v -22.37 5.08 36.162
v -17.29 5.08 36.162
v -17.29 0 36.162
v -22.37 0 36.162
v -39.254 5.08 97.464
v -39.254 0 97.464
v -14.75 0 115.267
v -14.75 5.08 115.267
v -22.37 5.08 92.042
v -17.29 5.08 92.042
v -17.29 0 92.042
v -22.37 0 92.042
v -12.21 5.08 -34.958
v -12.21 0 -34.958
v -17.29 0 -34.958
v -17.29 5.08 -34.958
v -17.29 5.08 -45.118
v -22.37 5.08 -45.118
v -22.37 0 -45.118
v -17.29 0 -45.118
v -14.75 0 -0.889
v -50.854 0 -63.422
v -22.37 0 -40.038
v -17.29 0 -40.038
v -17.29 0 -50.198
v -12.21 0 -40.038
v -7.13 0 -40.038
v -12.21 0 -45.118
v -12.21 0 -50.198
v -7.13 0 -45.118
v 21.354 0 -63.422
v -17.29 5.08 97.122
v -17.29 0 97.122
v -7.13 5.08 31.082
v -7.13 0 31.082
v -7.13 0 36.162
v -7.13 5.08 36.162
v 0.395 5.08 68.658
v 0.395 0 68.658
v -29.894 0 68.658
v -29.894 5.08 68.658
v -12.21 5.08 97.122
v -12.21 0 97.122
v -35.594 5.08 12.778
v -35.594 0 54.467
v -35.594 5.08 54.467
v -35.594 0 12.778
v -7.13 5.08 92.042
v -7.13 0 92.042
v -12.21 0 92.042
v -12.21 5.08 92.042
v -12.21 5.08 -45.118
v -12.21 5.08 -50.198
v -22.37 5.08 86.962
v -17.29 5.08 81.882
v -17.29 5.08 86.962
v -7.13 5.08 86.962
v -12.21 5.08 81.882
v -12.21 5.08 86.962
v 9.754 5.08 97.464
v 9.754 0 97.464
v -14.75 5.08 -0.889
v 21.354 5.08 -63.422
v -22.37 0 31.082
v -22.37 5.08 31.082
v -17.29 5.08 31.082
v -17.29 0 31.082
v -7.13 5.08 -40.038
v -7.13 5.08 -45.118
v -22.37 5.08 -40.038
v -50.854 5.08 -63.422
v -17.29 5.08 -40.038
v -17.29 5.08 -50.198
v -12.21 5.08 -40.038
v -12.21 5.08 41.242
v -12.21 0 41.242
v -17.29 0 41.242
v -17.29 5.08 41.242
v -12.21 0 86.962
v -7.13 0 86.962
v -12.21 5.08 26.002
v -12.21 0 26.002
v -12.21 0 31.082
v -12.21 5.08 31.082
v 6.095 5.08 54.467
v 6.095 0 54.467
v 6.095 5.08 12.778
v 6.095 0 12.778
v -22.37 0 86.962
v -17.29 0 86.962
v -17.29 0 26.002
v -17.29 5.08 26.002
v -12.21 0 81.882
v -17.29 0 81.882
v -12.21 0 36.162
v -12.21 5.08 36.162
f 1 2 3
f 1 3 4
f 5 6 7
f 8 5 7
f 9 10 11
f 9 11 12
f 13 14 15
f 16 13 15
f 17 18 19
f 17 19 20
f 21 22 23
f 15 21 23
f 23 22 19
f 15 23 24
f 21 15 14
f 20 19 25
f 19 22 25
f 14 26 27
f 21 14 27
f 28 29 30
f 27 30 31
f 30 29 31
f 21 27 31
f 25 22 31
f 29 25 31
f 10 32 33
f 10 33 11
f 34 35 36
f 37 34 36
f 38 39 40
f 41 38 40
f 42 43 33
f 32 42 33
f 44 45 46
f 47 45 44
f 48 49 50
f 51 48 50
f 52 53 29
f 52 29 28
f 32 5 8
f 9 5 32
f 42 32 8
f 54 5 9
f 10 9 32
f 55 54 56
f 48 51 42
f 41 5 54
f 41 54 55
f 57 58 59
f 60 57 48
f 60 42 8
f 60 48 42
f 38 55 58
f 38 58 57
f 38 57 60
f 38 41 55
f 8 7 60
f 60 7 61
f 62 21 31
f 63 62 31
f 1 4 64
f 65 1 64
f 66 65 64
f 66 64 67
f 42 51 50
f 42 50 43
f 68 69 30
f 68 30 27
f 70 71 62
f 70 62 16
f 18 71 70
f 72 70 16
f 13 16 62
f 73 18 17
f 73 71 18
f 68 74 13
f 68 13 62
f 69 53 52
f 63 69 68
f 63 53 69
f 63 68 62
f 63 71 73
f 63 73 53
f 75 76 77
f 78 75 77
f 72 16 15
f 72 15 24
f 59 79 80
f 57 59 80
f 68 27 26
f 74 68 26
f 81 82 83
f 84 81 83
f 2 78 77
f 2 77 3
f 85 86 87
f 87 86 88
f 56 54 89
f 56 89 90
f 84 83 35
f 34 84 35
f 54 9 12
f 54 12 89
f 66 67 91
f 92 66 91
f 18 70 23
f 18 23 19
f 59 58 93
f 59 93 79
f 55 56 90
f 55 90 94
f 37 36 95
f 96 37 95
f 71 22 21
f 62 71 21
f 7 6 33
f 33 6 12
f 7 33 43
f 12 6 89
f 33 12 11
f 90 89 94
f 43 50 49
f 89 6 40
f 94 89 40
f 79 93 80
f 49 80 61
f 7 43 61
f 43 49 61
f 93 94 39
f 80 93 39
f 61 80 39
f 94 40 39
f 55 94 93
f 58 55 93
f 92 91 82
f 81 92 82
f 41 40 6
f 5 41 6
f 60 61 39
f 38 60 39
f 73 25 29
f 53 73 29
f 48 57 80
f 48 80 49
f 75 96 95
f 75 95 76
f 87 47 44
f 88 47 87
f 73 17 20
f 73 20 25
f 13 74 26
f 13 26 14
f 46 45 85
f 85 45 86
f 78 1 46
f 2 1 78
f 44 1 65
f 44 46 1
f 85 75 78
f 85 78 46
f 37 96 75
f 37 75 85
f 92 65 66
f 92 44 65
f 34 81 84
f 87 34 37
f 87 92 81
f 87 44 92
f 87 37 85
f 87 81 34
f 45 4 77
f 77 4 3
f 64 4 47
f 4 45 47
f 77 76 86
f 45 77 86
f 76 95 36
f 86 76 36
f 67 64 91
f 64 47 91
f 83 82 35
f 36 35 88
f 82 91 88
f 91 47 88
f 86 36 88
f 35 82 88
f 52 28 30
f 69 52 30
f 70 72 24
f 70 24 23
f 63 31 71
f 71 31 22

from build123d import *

# Parameters (mm, degrees)
BOSS_EXTRUDE1_DEPTH   = 5.08
SKETCH3_W             = 41.68902
SKETCH3_H             = 41.68902
BOSS_EXTRUDE1_2_DEPTH = 5.08
BOSS_EXTRUDE1_3_DEPTH = 5.08


with BuildPart() as part:
    # Sketch3 → Boss-Extrude1 (new body)
    with BuildSketch(Plane(origin=(0, 0, 0), x_dir=(1, 0, 0), z_dir=(0, 1, 0))):
        Polygon((-14.749865829, 0.888926026), (21.35388455, 63.422456026), (-50.853616208, 63.422456026), align=None)
        Polygon((-14.749865829, 50.197946026), (-12.209865829, 50.197946026), (-12.209865829, 45.117946026), (-7.129865829, 45.117946026), (-7.129865829, 42.577946026), (-7.129865829, 40.037946026), (-12.209865829, 40.037946026), (-12.209865829, 34.957946026), (-14.749865829, 34.957946026), (-17.289865829, 34.957946026), (-17.289865829, 40.037946026), (-22.369865829, 40.037946026), (-22.369865829, 42.577946026), (-22.369865829, 45.117946026), (-17.289865829, 45.117946026), (-17.289865829, 50.197946026), align=None, mode=Mode.SUBTRACT)
    extrude(amount=BOSS_EXTRUDE1_DEPTH)


with BuildPart() as body_2:
    # Sketch3 → Boss-Extrude1 2 (new body)
    with BuildSketch(Plane(origin=(0, 0, 0), x_dir=(1, 0, 0), z_dir=(0, 1, 0))):
        with Locations((-14.749865829, -33.622053974)):
            Rectangle(SKETCH3_W, SKETCH3_H)
        Polygon((-7.129865829, -31.082053974), (-7.129865829, -33.622053974), (-7.129865829, -36.162053974), (-12.209865829, -36.162053974), (-12.209865829, -41.242053974), (-14.749865829, -41.242053974), (-17.289865829, -41.242053974), (-17.289865829, -36.162053974), (-22.369865829, -36.162053974), (-22.369865829, -33.622053974), (-22.369865829, -31.082053974), (-17.289865829, -31.082053974), (-17.289865829, -26.002053974), (-14.749865829, -26.002053974), (-12.209865829, -26.002053974), (-12.209865829, -31.082053974), align=None, mode=Mode.SUBTRACT)
    extrude(amount=BOSS_EXTRUDE1_2_DEPTH)


with BuildPart() as body_3:
    # Sketch3 → Boss-Extrude1 3 (new body)
    with BuildSketch(Plane(origin=(0, 0, 0), x_dir=(1, 0, 0), z_dir=(0, 1, 0))):
        Polygon((-14.749865829, -115.267285291), (9.754325309, -97.463948315), (0.394557161, -68.657543974), (-29.894288819, -68.657543974), (-39.254056968, -97.463948315), align=None)
        Polygon((-22.369865829, -92.042053974), (-22.369865829, -89.502053974), (-22.369865829, -86.962053974), (-17.289865829, -86.962053974), (-17.289865829, -81.882053974), (-14.749865829, -81.882053974), (-12.209865829, -81.882053974), (-12.209865829, -86.962053974), (-7.129865829, -86.962053974), (-7.129865829, -89.502053974), (-7.129865829, -92.042053974), (-12.209865829, -92.042053974), (-12.209865829, -97.122053974), (-14.749865829, -97.122053974), (-17.289865829, -97.122053974), (-17.289865829, -92.042053974), align=None, mode=Mode.SUBTRACT)
    extrude(amount=BOSS_EXTRUDE1_3_DEPTH)


solid = Compound([part.part, body_2.part, body_3.part])
